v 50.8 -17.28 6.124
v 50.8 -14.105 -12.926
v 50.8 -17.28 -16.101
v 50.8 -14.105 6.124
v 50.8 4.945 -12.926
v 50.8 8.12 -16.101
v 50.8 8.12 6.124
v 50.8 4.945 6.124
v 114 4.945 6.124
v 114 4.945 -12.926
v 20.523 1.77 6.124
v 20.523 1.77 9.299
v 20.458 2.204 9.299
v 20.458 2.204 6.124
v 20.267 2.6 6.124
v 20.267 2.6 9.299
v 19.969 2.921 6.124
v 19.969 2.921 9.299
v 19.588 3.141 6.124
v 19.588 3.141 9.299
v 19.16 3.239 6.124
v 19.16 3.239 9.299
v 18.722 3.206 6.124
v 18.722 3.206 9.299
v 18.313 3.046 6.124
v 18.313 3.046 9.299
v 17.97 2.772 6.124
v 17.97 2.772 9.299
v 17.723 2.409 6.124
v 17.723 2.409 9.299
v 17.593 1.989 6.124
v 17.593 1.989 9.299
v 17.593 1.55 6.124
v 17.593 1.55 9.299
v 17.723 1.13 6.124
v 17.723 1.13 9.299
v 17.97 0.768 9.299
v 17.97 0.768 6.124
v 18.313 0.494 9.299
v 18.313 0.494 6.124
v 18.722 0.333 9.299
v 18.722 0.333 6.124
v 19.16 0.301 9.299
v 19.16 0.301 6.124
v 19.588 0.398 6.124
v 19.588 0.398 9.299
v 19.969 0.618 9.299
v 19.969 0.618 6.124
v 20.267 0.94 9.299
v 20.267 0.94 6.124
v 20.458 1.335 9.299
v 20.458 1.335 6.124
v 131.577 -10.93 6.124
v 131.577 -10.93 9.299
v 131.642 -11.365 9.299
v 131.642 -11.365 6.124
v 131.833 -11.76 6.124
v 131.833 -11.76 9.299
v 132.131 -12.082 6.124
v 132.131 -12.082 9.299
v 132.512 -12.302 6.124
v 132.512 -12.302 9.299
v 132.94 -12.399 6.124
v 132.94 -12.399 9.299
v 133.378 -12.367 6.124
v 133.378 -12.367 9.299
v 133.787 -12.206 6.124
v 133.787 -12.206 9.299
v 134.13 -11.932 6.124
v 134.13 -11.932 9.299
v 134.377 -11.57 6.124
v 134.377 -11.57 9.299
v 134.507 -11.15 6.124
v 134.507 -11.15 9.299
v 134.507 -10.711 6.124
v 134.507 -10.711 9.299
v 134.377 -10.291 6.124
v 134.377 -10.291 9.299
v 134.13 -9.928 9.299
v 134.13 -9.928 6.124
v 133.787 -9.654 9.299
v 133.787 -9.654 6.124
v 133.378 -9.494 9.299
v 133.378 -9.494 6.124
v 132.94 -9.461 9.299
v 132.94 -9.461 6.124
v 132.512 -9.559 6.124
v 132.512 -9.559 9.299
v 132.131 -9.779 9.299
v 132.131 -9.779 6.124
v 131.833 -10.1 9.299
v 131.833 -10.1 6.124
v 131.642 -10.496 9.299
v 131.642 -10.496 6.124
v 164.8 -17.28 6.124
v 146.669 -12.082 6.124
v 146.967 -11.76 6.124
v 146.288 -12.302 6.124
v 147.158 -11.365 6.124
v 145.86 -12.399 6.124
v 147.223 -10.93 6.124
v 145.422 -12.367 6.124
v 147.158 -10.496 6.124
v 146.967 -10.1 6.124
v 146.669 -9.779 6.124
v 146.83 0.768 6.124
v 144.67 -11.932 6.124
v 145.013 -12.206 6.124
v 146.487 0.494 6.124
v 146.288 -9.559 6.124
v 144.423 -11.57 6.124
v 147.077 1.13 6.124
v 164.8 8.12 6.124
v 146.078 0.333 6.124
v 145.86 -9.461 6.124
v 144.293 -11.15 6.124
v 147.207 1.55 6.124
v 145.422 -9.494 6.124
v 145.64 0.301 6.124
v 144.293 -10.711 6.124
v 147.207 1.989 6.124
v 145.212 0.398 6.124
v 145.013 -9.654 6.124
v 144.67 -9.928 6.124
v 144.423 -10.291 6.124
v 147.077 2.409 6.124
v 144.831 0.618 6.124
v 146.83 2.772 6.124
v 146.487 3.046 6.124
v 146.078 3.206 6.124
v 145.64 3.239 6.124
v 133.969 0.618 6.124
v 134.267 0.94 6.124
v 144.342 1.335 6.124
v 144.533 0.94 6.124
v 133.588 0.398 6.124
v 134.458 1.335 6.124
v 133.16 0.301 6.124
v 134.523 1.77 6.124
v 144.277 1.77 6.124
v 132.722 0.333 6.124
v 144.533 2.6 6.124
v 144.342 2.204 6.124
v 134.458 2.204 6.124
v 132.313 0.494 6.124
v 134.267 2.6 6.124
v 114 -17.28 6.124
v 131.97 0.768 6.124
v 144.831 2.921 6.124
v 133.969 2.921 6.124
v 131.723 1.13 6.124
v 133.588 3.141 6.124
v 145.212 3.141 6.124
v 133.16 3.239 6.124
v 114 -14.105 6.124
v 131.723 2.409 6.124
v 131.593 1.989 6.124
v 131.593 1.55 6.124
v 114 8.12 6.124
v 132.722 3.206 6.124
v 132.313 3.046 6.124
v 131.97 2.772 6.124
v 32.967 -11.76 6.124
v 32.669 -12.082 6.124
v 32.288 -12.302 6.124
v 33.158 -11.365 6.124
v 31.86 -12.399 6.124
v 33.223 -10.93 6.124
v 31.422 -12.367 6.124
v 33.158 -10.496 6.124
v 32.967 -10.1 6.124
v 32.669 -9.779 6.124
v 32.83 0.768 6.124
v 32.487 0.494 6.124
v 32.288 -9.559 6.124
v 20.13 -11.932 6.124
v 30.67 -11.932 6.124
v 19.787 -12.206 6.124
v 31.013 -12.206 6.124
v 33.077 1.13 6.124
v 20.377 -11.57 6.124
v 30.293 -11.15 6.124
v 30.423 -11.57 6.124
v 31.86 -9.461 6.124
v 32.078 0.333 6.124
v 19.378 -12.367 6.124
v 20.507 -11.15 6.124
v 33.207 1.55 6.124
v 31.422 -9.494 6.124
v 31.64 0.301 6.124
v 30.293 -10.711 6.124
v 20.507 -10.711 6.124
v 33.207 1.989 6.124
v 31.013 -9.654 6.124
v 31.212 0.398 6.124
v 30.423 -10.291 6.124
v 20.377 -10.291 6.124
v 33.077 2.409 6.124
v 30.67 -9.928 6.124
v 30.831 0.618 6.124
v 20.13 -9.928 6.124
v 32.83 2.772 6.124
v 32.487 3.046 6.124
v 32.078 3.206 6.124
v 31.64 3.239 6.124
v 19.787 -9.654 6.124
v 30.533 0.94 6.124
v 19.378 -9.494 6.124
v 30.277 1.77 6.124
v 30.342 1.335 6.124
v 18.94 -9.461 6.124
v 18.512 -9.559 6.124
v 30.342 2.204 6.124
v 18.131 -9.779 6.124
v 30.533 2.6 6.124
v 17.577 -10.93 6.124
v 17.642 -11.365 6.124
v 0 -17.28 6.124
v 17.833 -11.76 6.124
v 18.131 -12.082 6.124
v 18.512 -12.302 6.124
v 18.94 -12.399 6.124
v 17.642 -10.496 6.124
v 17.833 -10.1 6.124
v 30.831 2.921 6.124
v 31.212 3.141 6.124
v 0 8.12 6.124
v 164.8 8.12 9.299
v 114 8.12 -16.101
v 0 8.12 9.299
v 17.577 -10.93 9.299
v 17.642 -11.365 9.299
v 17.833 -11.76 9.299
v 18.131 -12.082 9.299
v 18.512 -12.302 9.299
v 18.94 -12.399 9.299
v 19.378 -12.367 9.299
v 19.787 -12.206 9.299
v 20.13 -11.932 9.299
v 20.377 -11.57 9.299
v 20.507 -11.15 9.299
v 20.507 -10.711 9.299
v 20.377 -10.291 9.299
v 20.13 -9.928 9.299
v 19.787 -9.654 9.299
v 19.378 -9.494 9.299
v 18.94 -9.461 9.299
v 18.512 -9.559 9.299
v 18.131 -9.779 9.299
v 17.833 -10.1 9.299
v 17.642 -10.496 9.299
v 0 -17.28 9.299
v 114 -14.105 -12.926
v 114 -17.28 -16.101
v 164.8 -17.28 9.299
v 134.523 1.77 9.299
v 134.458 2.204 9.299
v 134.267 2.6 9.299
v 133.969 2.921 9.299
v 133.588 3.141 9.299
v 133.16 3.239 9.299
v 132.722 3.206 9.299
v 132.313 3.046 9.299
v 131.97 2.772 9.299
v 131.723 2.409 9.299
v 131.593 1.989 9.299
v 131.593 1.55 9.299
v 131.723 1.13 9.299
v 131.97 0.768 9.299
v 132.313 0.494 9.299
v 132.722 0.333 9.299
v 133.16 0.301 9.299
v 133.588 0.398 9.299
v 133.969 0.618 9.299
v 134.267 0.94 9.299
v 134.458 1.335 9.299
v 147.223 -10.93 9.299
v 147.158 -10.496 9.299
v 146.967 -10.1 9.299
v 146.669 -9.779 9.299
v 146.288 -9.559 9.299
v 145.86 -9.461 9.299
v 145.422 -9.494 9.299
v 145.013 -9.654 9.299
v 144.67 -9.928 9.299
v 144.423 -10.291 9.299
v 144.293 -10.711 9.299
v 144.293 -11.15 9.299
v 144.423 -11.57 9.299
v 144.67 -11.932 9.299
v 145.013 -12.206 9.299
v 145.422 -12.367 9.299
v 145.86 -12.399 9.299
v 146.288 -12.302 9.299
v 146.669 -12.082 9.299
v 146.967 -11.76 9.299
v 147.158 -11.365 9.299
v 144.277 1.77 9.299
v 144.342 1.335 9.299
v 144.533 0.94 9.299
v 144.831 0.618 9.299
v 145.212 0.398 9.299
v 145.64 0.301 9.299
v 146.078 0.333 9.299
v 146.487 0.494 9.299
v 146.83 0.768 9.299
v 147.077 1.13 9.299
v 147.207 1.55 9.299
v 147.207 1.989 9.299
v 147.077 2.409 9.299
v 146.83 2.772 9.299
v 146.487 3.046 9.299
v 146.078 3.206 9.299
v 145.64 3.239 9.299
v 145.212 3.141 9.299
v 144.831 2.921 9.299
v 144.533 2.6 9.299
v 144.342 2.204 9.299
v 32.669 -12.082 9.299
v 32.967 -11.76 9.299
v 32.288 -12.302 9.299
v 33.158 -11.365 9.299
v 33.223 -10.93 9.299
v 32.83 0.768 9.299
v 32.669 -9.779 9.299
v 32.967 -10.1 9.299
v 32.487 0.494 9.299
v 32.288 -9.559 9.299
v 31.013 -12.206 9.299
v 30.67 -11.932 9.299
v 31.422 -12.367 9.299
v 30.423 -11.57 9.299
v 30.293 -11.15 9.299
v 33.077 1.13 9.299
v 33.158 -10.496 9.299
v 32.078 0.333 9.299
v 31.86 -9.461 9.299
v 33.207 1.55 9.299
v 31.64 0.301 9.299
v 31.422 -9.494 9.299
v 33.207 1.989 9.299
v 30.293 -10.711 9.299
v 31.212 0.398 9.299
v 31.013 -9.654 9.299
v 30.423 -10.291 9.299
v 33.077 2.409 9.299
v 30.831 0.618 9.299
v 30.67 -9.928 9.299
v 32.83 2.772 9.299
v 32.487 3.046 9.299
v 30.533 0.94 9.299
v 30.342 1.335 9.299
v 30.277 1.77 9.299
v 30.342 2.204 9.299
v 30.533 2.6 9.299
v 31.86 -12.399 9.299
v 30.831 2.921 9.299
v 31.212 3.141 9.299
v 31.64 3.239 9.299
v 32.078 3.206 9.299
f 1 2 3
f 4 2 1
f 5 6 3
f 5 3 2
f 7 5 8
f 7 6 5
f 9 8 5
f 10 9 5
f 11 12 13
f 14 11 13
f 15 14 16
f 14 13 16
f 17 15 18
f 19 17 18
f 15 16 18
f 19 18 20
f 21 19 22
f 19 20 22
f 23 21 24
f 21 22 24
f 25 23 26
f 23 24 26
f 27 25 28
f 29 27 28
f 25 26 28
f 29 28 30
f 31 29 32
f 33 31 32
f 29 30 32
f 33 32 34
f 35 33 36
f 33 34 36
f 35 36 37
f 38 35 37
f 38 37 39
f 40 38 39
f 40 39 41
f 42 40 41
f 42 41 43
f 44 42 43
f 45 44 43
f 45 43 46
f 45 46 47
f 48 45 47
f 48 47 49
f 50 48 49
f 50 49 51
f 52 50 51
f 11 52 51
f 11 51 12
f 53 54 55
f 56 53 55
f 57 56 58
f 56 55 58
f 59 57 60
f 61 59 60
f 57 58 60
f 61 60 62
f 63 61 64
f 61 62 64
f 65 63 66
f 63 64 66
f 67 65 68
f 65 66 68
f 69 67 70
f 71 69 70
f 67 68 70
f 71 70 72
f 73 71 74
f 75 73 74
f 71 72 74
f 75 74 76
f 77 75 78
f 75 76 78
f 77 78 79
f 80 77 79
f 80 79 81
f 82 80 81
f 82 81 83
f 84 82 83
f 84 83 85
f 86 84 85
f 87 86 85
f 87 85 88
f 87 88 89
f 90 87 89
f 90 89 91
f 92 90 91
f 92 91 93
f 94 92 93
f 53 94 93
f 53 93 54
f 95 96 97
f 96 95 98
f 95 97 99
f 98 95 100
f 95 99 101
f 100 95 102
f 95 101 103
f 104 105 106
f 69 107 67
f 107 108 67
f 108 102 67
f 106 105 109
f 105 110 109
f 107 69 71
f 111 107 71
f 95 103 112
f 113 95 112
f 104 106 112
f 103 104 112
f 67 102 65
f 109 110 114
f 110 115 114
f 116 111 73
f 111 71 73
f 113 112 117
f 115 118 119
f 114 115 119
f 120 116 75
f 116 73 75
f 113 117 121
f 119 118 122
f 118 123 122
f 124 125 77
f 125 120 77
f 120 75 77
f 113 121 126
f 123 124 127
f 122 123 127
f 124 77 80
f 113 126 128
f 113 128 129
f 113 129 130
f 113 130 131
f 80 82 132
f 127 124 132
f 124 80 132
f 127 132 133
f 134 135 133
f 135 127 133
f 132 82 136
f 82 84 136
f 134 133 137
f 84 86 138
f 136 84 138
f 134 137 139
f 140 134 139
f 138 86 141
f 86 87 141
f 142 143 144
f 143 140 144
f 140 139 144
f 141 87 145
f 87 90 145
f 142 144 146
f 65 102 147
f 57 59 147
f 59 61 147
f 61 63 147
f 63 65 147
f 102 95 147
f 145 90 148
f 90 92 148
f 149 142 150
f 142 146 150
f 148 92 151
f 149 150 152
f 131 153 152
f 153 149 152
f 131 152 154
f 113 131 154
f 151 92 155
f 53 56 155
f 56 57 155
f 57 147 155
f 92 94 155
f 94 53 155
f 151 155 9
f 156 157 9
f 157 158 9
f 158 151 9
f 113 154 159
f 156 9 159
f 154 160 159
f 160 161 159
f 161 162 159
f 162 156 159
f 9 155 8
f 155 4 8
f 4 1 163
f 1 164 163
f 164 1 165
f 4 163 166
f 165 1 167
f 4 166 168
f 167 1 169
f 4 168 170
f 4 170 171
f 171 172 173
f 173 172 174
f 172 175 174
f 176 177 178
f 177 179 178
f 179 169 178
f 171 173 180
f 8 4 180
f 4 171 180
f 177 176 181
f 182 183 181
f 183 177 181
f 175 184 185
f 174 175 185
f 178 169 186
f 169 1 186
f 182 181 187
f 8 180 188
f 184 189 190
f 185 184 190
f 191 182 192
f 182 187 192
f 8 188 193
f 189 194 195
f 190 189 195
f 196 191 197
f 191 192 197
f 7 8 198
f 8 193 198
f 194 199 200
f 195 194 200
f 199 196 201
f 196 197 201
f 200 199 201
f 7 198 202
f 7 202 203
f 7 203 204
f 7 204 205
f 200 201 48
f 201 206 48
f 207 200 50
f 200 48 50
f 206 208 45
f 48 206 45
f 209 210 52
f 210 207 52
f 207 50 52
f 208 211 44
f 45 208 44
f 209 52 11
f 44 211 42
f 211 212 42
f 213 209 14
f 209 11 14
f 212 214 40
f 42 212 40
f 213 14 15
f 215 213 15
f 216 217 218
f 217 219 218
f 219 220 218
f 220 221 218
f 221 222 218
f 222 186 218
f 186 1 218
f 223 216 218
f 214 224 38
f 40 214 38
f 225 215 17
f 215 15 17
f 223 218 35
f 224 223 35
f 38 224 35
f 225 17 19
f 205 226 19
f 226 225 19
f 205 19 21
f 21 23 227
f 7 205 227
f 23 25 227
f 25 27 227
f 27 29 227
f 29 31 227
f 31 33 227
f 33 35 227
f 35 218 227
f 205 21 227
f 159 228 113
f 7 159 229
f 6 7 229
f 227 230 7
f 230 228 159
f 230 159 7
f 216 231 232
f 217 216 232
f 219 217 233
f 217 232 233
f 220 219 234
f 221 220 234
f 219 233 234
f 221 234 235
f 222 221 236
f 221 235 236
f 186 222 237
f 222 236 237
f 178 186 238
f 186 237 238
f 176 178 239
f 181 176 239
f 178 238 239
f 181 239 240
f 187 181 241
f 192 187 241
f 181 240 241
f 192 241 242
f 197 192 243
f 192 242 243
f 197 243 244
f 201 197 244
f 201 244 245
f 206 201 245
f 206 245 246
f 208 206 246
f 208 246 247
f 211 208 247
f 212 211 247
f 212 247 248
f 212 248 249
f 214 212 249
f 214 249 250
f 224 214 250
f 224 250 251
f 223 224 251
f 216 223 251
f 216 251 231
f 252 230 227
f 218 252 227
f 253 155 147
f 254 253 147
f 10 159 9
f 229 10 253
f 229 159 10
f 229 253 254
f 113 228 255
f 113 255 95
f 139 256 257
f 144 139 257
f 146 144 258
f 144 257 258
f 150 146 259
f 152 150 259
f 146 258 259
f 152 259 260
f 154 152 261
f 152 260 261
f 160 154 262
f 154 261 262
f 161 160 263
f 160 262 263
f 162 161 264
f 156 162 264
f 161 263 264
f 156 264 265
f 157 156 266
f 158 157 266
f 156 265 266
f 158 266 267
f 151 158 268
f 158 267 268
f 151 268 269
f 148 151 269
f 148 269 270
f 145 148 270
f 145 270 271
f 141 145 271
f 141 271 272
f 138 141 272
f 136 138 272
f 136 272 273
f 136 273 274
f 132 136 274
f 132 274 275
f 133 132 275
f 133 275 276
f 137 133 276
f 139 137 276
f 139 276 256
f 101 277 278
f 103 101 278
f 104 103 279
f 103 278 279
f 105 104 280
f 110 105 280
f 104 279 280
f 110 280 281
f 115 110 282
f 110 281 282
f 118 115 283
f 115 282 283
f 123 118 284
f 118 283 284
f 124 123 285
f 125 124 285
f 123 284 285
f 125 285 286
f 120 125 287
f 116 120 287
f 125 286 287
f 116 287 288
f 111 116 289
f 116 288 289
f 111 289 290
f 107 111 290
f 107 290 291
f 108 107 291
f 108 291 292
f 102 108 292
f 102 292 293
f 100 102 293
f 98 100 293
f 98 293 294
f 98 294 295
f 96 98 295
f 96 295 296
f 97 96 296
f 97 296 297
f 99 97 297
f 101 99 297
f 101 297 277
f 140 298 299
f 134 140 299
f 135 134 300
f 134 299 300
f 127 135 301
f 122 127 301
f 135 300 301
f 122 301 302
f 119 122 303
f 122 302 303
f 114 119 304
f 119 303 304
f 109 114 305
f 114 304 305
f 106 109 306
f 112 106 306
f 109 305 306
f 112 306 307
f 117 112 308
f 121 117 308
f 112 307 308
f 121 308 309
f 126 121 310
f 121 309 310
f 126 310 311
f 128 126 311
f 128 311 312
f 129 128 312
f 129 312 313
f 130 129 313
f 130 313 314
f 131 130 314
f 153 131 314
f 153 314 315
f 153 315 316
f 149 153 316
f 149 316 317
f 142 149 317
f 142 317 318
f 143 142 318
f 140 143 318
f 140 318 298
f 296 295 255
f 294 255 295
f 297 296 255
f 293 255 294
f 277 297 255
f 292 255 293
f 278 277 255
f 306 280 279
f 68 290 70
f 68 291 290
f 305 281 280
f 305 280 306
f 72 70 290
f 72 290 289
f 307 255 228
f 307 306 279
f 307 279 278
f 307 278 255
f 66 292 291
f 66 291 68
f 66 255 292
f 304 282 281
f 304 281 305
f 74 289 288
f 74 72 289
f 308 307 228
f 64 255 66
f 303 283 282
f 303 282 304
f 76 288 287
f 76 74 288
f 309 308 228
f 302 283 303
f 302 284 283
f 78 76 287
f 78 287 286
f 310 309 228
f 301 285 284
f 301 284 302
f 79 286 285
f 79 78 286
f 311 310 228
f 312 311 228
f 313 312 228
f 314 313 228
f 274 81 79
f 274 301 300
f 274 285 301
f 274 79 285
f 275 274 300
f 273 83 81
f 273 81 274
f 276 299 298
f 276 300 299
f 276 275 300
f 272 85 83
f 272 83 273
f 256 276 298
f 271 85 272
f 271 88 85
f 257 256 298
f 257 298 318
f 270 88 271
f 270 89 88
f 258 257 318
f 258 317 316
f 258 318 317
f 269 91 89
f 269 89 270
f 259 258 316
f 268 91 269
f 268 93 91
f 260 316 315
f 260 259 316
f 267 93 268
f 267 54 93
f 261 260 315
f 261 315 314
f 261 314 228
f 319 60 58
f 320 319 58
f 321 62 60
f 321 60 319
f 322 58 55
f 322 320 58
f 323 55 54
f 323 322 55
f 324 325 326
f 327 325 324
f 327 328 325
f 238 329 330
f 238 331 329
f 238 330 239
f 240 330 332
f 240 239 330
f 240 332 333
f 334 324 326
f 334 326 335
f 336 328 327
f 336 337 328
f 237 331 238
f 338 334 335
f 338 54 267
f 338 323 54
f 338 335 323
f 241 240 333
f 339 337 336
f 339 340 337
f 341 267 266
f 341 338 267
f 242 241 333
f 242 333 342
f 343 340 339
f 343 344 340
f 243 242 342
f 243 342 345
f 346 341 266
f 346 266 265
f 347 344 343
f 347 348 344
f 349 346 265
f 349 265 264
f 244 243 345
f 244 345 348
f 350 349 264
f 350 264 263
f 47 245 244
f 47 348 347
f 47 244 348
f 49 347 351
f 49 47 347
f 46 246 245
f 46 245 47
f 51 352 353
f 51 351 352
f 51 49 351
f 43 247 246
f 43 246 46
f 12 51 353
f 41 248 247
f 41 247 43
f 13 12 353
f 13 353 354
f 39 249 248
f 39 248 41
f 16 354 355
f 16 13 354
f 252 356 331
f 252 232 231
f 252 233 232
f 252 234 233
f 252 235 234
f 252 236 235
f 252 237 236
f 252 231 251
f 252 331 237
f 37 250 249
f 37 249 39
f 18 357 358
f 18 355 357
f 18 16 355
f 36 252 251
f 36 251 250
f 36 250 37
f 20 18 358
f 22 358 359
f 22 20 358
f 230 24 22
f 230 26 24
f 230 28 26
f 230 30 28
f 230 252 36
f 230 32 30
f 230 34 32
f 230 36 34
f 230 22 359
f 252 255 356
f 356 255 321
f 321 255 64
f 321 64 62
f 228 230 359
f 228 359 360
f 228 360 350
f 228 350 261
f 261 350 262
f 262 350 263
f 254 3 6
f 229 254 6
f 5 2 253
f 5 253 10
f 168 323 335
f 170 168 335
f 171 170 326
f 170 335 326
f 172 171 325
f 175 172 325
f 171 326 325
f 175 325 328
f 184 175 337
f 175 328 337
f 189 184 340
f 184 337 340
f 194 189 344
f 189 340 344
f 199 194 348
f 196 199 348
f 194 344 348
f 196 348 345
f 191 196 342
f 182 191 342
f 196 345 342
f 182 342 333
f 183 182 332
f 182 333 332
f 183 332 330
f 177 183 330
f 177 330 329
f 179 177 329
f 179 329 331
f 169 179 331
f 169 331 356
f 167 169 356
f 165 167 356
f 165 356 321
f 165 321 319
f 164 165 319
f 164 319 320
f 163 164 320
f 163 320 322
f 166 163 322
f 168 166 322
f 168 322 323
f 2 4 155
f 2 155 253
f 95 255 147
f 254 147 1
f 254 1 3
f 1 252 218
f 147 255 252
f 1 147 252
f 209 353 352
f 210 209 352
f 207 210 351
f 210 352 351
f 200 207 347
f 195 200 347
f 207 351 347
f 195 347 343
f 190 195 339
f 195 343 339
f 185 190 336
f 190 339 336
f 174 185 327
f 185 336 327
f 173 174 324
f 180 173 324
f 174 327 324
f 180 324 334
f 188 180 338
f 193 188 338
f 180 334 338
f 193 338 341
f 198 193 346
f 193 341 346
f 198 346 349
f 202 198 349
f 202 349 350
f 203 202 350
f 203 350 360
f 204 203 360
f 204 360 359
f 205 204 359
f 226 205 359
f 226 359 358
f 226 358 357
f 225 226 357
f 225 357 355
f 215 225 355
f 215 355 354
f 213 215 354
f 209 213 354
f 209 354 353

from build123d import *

# Parameters (mm, degrees)
SKETCH1_W           = 25.4
SKETCH1_H           = 25.4
SKETCH1_W_2         = 19.05
SKETCH1_H_2         = 19.05
BOSS_EXTRUDE1_DEPTH = 164.8
SKETCH2_W           = 22.225
SKETCH2_H           = 25.4
CUT_EXTRUDE1_DEPTH  = 50.8
SKETCH3_W           = 22.225
SKETCH3_H           = 25.4
CUT_EXTRUDE2_DEPTH  = 50.8
SKETCH4_R           = 1.4732
CUT_EXTRUDE3_DEPTH  = 50.8


with BuildPart() as part:
    # Sketch1 → Boss-Extrude1 (new body)
    with BuildSketch(Plane(origin=(0, 0, 0), x_dir=(0, 0, -1), z_dir=(1, 0, 0))):
        with Locations((3.400546448, -4.580327869)):
            Rectangle(SKETCH1_W, SKETCH1_H)
        with Locations((3.400546448, -4.580327869)):
            Rectangle(SKETCH1_W_2, SKETCH1_H_2, mode=Mode.SUBTRACT)
    extrude(amount=BOSS_EXTRUDE1_DEPTH)

    # Sketch2 → Cut-Extrude1 (cut)
    with BuildSketch(Plane(origin=(164.8, 0, 0), x_dir=(0, 0, -1), z_dir=(1, 0, 0))):
        with Locations((4.988046448, -4.580327869)):
            Rectangle(SKETCH2_W, SKETCH2_H)
    extrude(amount=-CUT_EXTRUDE1_DEPTH, mode=Mode.SUBTRACT)

    # Sketch3 → Cut-Extrude2 (cut)
    with BuildSketch(Plane.ZY):
        with Locations((-4.988046448, -4.580327869)):
            Rectangle(SKETCH3_W, SKETCH3_H)
    extrude(amount=-CUT_EXTRUDE2_DEPTH, mode=Mode.SUBTRACT)

    # Sketch4 → Cut-Extrude3 (cut)
    with BuildSketch(Plane.XY.offset(9.299453552)):
        with Locations((19.05, 1.769672131)):
            Circle(SKETCH4_R)
        with Locations(Location((31.75, 1.769672131, 0), (0, 0, 180))):
            Circle(SKETCH4_R)
        with Locations((31.75, -10.930327869)):
            Circle(SKETCH4_R)
        with Locations(Location((19.05, -10.930327869, 0), (0, 0, 180))):
            Circle(SKETCH4_R)
        with Locations((145.75, -10.930327869)):
            Circle(SKETCH4_R)
        with Locations(Location((133.05, -10.930327869, 0), (0, 0, 180))):
            Circle(SKETCH4_R)
        with Locations((133.05, 1.769672131)):
            Circle(SKETCH4_R)
        with Locations(Location((145.75, 1.769672131, 0), (0, 0, 180))):
            Circle(SKETCH4_R)
    extrude(amount=-CUT_EXTRUDE3_DEPTH, mode=Mode.SUBTRACT)


solid = part.part
